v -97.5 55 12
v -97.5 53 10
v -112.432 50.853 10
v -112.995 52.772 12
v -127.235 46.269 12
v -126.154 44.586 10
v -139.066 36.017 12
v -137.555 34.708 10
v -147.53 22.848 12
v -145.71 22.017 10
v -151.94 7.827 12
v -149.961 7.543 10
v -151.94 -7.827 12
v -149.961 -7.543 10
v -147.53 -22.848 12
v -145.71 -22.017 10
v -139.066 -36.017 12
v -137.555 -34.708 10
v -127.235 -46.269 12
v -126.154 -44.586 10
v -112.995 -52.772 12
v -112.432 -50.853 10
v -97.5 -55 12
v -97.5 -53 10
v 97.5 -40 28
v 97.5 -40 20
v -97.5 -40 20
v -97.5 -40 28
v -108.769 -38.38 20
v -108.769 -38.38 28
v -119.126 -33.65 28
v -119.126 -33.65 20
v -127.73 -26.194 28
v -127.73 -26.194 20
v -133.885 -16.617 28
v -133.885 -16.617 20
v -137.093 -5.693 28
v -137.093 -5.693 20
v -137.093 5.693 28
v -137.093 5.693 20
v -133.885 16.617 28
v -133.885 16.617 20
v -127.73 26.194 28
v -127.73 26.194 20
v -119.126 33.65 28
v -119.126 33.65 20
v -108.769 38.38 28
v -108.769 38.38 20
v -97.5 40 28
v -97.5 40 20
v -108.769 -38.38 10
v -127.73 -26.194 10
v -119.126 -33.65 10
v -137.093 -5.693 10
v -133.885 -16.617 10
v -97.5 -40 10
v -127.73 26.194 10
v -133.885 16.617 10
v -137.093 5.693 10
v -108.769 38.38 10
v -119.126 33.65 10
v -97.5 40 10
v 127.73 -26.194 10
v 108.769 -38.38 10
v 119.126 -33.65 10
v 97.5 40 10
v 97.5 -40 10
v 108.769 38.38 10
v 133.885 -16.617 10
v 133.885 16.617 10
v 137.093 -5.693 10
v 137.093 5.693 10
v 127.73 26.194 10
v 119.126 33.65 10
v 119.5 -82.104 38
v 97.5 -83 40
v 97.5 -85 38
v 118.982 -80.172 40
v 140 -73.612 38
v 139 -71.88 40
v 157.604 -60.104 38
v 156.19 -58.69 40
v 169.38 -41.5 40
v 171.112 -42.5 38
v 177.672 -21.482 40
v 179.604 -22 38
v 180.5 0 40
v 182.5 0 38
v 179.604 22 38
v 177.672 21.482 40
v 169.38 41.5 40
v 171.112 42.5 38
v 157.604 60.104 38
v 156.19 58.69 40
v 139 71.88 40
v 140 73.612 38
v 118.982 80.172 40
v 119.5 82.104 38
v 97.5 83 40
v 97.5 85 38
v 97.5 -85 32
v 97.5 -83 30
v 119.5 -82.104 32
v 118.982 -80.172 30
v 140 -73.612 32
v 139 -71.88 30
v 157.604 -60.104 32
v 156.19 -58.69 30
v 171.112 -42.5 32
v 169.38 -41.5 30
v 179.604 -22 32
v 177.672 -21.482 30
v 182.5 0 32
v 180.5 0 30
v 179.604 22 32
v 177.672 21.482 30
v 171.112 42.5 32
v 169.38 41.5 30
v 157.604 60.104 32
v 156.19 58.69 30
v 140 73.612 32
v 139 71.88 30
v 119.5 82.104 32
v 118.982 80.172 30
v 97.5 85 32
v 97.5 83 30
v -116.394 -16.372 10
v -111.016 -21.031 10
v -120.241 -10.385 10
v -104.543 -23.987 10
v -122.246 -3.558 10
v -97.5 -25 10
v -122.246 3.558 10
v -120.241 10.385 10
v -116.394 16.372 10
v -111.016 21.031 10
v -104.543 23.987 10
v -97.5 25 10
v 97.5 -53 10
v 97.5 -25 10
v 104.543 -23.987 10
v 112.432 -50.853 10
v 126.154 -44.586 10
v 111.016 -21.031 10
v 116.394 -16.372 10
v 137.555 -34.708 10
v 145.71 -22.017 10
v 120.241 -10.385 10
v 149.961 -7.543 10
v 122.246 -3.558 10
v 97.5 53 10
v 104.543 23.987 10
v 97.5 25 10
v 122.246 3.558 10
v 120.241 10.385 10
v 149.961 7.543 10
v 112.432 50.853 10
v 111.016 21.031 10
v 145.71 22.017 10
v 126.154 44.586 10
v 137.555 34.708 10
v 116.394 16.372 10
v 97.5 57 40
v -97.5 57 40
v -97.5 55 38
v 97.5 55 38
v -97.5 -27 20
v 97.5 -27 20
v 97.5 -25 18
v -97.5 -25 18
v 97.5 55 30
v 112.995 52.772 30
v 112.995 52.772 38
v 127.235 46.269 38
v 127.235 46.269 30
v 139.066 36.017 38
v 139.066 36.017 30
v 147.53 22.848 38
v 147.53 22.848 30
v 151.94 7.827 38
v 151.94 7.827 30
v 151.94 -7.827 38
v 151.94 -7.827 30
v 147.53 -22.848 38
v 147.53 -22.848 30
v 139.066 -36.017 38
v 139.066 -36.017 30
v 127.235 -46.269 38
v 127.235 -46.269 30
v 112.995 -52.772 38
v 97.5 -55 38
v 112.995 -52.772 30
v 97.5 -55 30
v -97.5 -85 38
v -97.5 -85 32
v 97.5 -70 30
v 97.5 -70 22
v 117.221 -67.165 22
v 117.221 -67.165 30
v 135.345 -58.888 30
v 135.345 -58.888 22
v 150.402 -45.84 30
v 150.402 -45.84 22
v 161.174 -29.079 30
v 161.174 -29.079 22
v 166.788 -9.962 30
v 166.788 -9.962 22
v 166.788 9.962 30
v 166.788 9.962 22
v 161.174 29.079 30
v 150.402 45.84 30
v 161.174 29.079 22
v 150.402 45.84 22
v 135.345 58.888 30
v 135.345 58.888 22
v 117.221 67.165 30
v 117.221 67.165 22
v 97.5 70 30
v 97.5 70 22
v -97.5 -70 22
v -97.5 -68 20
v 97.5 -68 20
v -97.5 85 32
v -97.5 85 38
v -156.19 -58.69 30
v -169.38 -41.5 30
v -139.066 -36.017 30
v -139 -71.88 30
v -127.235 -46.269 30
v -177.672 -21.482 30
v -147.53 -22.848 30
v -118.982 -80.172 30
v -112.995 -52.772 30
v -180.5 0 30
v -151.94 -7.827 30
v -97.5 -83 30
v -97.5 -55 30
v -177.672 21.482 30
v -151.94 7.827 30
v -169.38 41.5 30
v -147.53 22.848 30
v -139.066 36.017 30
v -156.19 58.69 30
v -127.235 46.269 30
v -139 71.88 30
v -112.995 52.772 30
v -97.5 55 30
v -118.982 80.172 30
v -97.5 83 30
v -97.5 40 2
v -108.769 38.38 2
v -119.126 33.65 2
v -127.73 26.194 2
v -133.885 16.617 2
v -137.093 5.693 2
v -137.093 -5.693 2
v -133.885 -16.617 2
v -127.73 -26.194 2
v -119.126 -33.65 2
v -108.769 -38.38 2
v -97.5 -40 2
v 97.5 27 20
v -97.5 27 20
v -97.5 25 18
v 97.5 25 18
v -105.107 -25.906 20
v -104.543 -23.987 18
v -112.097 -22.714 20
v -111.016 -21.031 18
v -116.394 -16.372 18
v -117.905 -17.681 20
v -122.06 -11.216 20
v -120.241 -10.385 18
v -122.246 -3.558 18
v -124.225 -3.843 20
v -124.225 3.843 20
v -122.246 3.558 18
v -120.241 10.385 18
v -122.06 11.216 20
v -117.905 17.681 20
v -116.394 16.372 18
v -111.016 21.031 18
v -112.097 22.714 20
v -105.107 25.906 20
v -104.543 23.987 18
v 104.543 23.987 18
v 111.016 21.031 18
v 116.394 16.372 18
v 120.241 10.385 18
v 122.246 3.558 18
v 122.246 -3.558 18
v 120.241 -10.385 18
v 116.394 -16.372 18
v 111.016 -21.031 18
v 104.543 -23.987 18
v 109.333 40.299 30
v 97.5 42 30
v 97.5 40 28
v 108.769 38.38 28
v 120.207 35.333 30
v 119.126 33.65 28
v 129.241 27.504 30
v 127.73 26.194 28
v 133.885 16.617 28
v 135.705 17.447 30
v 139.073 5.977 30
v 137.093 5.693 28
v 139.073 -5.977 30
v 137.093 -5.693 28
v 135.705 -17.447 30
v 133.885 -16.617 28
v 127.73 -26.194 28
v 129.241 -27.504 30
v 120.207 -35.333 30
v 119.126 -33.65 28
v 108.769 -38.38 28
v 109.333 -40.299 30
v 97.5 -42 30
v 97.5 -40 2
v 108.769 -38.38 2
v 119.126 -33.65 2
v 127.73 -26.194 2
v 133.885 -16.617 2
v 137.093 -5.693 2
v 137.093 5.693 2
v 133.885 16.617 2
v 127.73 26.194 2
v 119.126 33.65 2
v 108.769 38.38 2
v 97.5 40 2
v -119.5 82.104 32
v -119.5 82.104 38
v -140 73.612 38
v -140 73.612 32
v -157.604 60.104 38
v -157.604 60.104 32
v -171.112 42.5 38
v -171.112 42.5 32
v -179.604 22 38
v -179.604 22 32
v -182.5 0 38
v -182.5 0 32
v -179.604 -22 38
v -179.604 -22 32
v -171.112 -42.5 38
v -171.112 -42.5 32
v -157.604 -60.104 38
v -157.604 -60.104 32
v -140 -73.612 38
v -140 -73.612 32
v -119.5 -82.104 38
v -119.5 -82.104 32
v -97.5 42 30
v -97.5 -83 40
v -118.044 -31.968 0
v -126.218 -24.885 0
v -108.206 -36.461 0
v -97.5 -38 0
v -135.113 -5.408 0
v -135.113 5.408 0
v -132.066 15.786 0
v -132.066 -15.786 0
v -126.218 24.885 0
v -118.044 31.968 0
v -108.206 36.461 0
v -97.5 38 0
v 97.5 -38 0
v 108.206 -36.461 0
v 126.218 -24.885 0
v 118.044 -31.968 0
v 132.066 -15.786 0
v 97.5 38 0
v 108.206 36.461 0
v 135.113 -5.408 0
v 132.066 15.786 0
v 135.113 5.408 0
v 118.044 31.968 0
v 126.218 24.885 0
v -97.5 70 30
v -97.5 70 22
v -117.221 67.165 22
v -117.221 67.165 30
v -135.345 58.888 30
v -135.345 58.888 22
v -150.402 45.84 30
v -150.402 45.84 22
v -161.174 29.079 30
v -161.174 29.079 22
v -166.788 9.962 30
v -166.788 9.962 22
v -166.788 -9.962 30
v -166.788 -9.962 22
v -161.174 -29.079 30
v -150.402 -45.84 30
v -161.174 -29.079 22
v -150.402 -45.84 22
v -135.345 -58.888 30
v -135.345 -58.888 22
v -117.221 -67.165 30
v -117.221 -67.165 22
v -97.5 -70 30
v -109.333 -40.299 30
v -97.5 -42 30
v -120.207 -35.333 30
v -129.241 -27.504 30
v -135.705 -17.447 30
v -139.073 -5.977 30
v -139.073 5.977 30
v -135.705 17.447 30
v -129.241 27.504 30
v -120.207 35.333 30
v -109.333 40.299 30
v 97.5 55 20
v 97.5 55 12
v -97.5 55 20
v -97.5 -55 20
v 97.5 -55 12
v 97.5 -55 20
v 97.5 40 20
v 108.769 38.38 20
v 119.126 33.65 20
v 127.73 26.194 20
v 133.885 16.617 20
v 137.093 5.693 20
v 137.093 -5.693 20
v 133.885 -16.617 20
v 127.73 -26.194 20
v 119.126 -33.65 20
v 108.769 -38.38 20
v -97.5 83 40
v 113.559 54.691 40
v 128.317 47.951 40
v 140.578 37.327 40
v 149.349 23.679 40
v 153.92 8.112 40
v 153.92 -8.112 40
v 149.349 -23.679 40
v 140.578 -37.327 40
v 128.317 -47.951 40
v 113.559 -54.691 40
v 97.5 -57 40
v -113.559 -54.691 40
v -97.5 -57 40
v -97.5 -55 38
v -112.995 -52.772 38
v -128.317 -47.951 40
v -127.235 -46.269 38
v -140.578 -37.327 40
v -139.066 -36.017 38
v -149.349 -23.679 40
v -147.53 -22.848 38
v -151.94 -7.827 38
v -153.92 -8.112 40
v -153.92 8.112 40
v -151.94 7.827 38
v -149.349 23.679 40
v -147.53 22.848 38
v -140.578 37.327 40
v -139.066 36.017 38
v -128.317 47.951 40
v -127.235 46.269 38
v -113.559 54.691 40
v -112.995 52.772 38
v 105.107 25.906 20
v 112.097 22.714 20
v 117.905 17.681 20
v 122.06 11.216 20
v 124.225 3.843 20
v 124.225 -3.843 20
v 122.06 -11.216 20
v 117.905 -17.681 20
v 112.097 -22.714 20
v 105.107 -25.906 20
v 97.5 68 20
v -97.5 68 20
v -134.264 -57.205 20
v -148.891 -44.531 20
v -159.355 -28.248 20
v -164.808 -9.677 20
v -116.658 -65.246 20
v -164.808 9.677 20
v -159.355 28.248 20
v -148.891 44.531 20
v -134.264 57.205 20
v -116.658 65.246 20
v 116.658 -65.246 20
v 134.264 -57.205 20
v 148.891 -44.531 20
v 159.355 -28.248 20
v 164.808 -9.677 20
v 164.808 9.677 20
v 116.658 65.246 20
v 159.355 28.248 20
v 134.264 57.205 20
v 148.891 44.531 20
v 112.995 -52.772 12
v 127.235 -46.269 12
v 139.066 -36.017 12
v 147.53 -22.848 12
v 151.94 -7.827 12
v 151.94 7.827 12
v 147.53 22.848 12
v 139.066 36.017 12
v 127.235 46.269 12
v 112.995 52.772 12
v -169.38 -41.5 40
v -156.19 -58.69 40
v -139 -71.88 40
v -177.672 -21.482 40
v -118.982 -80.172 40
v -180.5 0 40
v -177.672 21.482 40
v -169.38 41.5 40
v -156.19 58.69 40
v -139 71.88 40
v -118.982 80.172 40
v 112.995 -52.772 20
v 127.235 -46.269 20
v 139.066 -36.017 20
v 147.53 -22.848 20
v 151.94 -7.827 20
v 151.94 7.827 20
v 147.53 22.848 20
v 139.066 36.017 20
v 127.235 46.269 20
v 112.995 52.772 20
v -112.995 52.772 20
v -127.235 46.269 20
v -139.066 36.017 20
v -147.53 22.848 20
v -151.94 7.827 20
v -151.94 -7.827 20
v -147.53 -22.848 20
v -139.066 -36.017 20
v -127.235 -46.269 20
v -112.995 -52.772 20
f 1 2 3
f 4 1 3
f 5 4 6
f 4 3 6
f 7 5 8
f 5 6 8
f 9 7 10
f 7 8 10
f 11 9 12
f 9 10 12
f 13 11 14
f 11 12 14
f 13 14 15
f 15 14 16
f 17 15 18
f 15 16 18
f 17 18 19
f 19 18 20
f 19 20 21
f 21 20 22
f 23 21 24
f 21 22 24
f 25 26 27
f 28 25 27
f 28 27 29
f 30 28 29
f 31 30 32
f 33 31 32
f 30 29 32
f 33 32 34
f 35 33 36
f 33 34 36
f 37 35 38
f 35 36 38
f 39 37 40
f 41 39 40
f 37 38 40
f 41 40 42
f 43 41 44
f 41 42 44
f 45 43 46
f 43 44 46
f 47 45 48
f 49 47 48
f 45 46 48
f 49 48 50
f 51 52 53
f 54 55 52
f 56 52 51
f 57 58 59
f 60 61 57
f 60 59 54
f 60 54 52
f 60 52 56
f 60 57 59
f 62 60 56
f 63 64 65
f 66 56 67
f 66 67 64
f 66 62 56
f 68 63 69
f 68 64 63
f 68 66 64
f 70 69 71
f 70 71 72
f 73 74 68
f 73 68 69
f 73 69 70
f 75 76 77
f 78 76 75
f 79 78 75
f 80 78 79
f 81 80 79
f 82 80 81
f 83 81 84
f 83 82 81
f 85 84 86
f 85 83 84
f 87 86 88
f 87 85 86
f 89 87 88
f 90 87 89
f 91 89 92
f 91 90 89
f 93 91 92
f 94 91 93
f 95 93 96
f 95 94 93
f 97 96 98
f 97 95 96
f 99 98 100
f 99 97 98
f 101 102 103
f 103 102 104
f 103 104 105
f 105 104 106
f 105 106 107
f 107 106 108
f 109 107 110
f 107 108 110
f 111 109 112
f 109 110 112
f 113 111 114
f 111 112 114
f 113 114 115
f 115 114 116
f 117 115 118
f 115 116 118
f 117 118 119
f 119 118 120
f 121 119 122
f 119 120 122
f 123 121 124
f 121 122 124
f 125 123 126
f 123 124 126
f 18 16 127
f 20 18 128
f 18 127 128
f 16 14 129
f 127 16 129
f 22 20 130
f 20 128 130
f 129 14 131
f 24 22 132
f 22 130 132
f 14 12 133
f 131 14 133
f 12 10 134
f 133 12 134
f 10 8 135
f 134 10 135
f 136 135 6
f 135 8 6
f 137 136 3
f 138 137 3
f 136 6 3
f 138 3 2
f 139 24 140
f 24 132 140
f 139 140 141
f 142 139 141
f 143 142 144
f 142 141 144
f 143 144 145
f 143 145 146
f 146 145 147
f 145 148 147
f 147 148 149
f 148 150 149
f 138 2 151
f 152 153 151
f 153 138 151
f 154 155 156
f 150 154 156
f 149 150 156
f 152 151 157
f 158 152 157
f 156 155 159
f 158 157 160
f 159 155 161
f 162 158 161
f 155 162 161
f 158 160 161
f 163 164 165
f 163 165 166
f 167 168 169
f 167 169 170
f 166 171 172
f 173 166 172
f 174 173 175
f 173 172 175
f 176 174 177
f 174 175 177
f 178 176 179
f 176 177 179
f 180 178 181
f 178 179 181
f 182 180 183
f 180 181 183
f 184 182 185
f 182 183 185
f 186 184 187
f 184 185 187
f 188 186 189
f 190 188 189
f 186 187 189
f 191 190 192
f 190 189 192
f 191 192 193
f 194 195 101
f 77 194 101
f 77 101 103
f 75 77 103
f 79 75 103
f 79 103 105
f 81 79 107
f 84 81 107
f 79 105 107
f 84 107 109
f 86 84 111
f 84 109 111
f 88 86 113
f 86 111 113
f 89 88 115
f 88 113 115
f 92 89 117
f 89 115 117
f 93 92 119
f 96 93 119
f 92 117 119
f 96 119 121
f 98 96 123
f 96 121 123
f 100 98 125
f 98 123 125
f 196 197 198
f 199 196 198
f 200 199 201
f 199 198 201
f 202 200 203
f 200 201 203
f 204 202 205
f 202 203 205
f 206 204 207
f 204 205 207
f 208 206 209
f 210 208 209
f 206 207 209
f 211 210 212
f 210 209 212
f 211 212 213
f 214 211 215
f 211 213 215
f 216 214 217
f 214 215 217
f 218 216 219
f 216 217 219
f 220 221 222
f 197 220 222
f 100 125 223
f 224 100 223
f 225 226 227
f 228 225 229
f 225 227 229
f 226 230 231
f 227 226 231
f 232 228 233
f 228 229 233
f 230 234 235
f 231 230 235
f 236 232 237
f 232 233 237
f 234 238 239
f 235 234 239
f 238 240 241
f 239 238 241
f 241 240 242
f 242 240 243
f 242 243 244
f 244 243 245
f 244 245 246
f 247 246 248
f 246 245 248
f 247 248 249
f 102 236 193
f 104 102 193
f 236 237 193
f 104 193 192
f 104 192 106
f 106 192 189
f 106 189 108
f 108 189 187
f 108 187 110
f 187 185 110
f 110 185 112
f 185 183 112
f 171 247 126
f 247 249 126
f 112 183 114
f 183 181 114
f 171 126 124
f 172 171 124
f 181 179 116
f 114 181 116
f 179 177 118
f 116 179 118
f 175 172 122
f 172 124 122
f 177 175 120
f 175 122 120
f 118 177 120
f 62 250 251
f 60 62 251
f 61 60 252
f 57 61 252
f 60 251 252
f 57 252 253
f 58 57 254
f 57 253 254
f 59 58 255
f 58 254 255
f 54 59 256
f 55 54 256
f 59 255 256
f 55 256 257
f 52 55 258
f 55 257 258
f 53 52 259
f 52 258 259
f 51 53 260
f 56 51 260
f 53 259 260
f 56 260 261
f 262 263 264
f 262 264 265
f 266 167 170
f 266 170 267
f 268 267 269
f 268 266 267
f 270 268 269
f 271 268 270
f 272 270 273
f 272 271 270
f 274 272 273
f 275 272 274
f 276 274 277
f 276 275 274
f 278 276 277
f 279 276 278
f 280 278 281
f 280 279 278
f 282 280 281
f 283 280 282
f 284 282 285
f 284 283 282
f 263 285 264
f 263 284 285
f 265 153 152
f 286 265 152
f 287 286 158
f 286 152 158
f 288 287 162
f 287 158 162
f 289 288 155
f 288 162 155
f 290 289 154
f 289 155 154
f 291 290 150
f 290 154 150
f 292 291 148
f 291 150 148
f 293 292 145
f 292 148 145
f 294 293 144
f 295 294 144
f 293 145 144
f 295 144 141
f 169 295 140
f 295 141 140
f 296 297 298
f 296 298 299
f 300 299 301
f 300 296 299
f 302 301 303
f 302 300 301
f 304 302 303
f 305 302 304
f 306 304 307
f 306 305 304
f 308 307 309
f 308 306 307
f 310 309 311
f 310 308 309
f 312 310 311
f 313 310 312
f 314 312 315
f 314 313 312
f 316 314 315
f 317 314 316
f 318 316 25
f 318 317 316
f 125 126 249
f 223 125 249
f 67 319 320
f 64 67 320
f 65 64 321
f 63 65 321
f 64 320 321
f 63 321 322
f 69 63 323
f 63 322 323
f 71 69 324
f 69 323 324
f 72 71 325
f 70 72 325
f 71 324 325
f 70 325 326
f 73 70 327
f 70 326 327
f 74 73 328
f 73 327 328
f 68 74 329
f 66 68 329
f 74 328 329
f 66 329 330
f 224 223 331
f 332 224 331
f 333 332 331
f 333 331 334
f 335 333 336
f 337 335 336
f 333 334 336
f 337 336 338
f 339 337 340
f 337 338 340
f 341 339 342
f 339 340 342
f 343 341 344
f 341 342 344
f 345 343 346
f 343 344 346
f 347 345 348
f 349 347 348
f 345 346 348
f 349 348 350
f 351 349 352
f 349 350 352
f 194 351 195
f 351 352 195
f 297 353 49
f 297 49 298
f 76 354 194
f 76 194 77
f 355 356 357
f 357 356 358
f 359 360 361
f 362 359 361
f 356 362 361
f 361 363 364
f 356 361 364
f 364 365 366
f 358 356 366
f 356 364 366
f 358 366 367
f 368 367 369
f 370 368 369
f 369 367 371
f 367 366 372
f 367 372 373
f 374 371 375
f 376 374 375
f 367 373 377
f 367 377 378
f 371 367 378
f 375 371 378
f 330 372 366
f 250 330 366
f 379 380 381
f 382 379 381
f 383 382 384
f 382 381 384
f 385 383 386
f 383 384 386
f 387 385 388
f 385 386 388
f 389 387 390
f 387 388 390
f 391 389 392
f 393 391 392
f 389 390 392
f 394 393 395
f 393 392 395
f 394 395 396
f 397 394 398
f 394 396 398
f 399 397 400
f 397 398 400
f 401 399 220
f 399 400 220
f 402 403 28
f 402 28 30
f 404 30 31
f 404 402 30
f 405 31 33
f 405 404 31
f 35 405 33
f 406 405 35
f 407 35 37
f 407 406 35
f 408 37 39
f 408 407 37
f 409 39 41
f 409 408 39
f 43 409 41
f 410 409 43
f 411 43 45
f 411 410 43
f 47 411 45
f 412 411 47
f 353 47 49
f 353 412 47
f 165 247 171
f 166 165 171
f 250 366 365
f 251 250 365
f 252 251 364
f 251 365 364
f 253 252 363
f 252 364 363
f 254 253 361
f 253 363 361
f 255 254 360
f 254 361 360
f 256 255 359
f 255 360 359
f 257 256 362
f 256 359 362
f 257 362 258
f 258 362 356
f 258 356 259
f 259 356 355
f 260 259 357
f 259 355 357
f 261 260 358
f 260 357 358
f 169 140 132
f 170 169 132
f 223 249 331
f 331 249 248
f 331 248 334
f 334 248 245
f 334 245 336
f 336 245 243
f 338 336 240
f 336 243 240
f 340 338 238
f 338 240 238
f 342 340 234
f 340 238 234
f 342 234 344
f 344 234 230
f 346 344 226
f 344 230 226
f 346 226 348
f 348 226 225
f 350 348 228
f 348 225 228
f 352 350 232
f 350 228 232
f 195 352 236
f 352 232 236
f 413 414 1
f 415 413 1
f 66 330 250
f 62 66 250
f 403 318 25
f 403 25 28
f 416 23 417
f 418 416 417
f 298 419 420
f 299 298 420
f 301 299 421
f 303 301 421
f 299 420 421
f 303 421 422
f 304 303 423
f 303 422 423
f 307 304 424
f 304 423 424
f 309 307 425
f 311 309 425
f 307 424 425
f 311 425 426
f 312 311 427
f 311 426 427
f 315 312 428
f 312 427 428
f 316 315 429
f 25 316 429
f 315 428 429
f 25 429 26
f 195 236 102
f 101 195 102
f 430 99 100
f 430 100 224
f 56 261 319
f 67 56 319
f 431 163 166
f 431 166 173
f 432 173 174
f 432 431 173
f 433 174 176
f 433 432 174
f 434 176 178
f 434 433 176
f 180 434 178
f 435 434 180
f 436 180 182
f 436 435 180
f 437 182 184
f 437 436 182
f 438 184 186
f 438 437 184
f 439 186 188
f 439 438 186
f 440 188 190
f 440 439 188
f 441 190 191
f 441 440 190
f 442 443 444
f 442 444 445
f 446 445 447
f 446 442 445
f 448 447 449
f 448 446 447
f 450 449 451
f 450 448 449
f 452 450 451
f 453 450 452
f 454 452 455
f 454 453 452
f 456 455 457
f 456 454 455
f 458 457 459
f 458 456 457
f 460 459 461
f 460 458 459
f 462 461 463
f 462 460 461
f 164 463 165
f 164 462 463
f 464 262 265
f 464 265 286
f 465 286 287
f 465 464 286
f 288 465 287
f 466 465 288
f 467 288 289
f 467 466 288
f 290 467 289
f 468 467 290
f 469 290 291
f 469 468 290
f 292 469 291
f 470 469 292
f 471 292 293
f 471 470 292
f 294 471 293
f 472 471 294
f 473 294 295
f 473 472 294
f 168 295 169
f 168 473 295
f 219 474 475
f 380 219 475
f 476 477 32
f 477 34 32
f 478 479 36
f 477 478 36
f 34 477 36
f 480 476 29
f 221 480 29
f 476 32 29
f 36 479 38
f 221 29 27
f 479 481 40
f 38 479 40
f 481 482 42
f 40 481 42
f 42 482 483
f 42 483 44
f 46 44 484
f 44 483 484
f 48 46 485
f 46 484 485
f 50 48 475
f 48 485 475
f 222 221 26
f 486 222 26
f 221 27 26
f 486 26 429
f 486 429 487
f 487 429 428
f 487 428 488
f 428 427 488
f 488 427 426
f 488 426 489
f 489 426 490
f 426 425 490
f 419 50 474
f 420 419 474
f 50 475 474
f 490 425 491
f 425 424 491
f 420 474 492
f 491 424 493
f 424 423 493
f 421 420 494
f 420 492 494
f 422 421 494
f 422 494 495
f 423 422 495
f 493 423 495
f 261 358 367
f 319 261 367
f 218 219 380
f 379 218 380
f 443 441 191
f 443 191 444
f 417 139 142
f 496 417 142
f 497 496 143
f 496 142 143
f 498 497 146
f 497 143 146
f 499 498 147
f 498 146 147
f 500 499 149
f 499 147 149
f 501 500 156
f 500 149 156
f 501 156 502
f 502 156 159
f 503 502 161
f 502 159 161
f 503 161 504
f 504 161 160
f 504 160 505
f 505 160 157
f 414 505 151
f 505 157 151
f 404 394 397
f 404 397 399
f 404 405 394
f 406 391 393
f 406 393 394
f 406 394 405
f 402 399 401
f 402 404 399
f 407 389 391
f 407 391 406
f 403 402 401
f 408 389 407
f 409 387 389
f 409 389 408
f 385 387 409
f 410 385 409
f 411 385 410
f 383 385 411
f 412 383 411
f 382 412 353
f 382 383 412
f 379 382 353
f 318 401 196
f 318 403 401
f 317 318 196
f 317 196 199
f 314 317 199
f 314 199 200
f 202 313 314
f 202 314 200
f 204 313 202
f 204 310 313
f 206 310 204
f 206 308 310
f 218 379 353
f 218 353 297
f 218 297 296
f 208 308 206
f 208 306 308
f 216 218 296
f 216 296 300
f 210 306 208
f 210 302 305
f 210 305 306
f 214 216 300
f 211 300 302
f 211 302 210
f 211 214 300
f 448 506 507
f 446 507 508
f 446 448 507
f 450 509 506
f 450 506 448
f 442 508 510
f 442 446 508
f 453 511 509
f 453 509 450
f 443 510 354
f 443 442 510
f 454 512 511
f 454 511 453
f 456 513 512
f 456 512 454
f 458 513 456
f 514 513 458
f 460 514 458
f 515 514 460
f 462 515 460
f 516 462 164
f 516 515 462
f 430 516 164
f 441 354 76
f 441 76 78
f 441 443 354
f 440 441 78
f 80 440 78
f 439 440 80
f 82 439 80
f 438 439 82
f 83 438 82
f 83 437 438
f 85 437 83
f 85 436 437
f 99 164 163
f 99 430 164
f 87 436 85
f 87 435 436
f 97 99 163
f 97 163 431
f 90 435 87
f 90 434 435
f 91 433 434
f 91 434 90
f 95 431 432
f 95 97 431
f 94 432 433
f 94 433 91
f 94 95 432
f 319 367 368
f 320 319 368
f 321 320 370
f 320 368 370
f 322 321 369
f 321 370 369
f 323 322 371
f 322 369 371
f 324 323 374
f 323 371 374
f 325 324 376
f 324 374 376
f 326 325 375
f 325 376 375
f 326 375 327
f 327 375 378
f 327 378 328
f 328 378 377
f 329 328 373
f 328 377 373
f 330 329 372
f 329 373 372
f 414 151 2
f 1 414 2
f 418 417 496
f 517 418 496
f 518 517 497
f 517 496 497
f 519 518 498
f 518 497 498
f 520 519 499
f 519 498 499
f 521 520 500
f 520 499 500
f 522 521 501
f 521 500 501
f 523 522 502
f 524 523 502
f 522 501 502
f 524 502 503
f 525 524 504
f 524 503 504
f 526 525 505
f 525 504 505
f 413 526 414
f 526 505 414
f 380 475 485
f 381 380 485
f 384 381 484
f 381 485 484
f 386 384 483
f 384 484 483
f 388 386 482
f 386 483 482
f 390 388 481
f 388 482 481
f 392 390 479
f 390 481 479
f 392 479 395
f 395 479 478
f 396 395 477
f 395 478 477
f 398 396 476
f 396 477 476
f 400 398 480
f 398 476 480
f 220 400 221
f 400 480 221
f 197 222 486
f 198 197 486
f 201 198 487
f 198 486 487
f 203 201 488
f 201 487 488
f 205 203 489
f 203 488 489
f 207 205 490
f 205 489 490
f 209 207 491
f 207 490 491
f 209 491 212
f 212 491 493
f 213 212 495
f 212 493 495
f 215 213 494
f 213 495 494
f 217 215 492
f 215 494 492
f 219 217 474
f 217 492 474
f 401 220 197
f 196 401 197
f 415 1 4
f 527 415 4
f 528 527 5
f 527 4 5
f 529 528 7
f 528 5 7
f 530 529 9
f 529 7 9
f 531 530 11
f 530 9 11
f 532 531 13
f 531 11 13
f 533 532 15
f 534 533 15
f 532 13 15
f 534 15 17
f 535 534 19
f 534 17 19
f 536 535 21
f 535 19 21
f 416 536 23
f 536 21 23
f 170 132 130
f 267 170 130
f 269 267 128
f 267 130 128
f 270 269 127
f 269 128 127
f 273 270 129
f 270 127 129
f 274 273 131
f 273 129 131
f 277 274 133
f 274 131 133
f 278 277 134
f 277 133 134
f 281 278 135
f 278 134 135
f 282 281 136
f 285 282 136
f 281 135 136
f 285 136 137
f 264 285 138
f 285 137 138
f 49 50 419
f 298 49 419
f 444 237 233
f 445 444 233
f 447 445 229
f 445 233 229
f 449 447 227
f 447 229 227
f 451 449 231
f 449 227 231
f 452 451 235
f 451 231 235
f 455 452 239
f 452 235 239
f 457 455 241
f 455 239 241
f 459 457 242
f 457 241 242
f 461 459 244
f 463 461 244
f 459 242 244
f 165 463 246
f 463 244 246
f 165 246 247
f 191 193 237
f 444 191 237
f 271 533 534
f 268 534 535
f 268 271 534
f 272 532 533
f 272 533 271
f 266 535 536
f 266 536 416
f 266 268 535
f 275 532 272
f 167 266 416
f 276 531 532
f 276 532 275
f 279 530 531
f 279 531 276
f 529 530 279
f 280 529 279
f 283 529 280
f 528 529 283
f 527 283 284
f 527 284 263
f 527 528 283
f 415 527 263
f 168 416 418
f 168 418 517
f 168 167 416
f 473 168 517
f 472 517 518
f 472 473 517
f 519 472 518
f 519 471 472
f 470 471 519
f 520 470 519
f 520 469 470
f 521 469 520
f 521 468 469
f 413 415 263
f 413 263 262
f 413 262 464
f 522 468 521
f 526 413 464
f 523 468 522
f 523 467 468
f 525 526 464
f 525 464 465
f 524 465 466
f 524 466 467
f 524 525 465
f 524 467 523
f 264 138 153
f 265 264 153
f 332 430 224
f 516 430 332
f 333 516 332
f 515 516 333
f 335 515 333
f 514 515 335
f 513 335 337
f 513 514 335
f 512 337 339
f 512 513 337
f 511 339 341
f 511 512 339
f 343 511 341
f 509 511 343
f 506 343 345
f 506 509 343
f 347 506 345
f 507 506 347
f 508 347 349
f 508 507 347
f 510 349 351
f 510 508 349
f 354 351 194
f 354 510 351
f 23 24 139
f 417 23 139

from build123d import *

# Parameters (mm, degrees)
F1_DEPTH  = 10
F3_DEPTH  = 10
F5_DEPTH  = 10
F7_DEPTH  = 10
F8_SIZE   = 2
F8_2_SIZE = 2
F8_3_SIZE = 2
F8_4_SIZE = 2


with BuildPart() as f1:
    # F0 (on Top) → F1 (new body)
    with BuildSketch(Plane.XY):
        with BuildLine():
            Line((97.5, 40), (-97.5, 40))
            ThreePointArc((-97.5, 40), (-137.5, 0), (-97.5, -40))
            Line((-97.5, -40), (97.5, -40))
            ThreePointArc((97.5, -40), (137.5, 0), (97.5, 40))
        make_face()
    extrude(amount=F1_DEPTH)

    # F8#4
    f8_4_edges = [f1.edges().sort_by_distance(p)[0] for p in [
        (0, 40, 0),
    ]]
    chamfer(f8_4_edges, length=F8_4_SIZE)


with BuildPart() as f3:
    # F2 (on face) → F3 (new body)
    with BuildSketch(Plane.XY.offset(10)):
        with BuildLine():
            ThreePointArc((-97.5, 55), (-152.5, 0), (-97.5, -55))
            Line((-97.5, -55), (97.5, -55))
            ThreePointArc((97.5, -55), (152.5, 0), (97.5, 55))
            Line((97.5, 55), (-97.5, 55))
        make_face()
        with BuildLine():
            ThreePointArc((-97.5, -40), (-137.5, 0), (-97.5, 40))
            Line((-97.5, 40), (97.5, 40))
            ThreePointArc((97.5, 40), (137.5, 0), (97.5, -40))
            Line((97.5, -40), (-97.5, -40))
        make_face(mode=Mode.SUBTRACT)
        with BuildLine():
            Line((97.5, 40), (-97.5, 40))
            ThreePointArc((-97.5, 40), (-137.5, 0), (-97.5, -40))
            Line((-97.5, -40), (97.5, -40))
            ThreePointArc((97.5, -40), (137.5, 0), (97.5, 40))
        make_face()
        with BuildLine():
            Line((97.5, -25), (-97.5, -25))
            ThreePointArc((-97.5, -25), (-122.5, 0), (-97.5, 25))
            Line((-97.5, 25), (97.5, 25))
            ThreePointArc((97.5, 25), (122.5, 0), (97.5, -25))
        make_face(mode=Mode.SUBTRACT)
    extrude(amount=F3_DEPTH)

    # F8
    f8_edges = [f3.edges().sort_by_distance(p)[0] for p in [
        (0, -25, 20),
        (0, 55, 10),
    ]]
    chamfer(f8_edges, length=F8_SIZE)


with BuildPart() as f5:
    # F4 (on face) → F5 (new body)
    with BuildSketch(Plane.XY.offset(20)):
        with BuildLine():
            Line((97.5, 70), (-97.5, 70))
            ThreePointArc((-97.5, 70), (-167.5, 0), (-97.5, -70))
            Line((-97.5, -70), (97.5, -70))
            ThreePointArc((97.5, -70), (167.5, 0), (97.5, 70))
        make_face()
        with BuildLine():
            ThreePointArc((-97.5, -55), (-152.5, 0), (-97.5, 55))
            Line((-97.5, 55), (97.5, 55))
            ThreePointArc((97.5, 55), (152.5, 0), (97.5, -55))
            Line((97.5, -55), (-97.5, -55))
        make_face(mode=Mode.SUBTRACT)
        with BuildLine():
            Line((97.5, 55), (-97.5, 55))
            ThreePointArc((-97.5, 55), (-152.5, 0), (-97.5, -55))
            Line((-97.5, -55), (97.5, -55))
            ThreePointArc((97.5, -55), (152.5, 0), (97.5, 55))
        make_face()
        with BuildLine():
            ThreePointArc((-97.5, -40), (-137.5, 0), (-97.5, 40))
            Line((-97.5, 40), (97.5, 40))
            ThreePointArc((97.5, 40), (137.5, 0), (97.5, -40))
            Line((97.5, -40), (-97.5, -40))
        make_face(mode=Mode.SUBTRACT)
    extrude(amount=F5_DEPTH)

    # F8#2
    f8_2_edges = [f5.edges().sort_by_distance(p)[0] for p in [
        (0, -40, 30),
        (0, 70, 20),
    ]]
    chamfer(f8_2_edges, length=F8_2_SIZE)


with BuildPart() as f7:
    # F6 (on face) → F7 (new body)
    with BuildSketch(Plane.XY.offset(30)):
        with BuildLine():
            ThreePointArc((-97.5, 85), (-182.5, 0), (-97.5, -85))
            Line((-97.5, -85), (97.5, -85))
            ThreePointArc((97.5, -85), (182.5, 0), (97.5, 85))
            Line((97.5, 85), (-97.5, 85))
        make_face()
        with BuildLine():
            Line((97.5, -70), (-97.5, -70))
            ThreePointArc((-97.5, -70), (-167.5, 0), (-97.5, 70))
            Line((-97.5, 70), (97.5, 70))
            ThreePointArc((97.5, 70), (167.5, 0), (97.5, -70))
        make_face(mode=Mode.SUBTRACT)
        with BuildLine():
            ThreePointArc((-97.5, 70), (-167.5, 0), (-97.5, -70))
            Line((-97.5, -70), (97.5, -70))
            ThreePointArc((97.5, -70), (167.5, 0), (97.5, 70))
            Line((97.5, 70), (-97.5, 70))
        make_face()
        with BuildLine():
            ThreePointArc((97.5, 55), (152.5, 0), (97.5, -55))
            Line((97.5, -55), (-97.5, -55))
            ThreePointArc((-97.5, -55), (-152.5, 0), (-97.5, 55))
            Line((-97.5, 55), (97.5, 55))
        make_face(mode=Mode.SUBTRACT)
    extrude(amount=F7_DEPTH)

    # F8#3
    f8_3_edges = [f7.edges().sort_by_distance(p)[0] for p in [
        (0, -55, 40),
        (0, 85, 40),
        (-182.5, 0, 30),
    ]]
    chamfer(f8_3_edges, length=F8_3_SIZE)


solid = Compound([f1.part, f3.part, f5.part, f7.part])
